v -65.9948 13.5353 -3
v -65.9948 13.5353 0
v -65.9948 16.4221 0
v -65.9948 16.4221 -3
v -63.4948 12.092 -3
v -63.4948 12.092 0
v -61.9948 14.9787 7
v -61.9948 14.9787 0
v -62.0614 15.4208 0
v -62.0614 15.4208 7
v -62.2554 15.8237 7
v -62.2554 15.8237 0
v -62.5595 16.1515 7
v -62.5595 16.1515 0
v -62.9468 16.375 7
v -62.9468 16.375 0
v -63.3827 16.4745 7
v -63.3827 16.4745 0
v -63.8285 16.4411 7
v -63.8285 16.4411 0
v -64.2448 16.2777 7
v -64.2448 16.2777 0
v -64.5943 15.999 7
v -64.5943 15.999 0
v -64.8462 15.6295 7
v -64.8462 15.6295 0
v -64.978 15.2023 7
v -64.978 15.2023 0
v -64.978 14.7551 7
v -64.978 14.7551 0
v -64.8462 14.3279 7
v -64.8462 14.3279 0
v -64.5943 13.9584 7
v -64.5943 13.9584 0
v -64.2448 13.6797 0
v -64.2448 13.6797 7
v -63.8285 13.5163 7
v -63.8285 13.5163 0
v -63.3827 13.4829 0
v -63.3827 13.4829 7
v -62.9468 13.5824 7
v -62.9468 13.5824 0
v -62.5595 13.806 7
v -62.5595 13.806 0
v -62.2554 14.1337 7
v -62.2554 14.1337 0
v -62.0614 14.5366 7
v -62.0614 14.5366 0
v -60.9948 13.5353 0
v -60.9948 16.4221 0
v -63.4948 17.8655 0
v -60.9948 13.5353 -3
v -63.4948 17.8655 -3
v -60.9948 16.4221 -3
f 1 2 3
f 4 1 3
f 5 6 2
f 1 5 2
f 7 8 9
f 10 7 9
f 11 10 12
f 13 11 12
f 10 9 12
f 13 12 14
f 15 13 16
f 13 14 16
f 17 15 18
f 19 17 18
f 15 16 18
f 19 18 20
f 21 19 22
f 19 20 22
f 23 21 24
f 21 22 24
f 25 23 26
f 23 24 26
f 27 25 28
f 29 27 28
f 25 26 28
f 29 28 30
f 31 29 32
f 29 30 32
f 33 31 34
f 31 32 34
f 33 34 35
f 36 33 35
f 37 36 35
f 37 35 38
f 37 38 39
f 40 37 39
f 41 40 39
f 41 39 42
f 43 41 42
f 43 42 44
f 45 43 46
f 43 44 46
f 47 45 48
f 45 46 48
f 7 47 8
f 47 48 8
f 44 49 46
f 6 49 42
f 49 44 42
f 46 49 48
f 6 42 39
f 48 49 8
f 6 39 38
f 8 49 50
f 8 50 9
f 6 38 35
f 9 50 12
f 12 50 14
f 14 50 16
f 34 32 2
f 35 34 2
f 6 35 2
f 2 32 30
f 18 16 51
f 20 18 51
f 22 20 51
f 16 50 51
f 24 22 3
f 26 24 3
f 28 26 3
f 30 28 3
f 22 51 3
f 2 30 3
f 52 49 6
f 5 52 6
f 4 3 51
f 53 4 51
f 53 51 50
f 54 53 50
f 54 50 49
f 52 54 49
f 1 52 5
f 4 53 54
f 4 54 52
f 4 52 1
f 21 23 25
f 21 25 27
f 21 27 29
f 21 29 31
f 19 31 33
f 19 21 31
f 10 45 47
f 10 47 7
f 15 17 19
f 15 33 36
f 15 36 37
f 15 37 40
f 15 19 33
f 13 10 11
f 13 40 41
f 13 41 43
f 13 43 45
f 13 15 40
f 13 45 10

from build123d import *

# Parameters (mm, degrees)
SKETCH1_R           = 1.5
BOSS_EXTRUDE1_DEPTH = 7
BOSS_EXTRUDE2_DEPTH = 3


with BuildPart() as part:
    # Sketch1 → Boss-Extrude1 (new body)
    with BuildSketch(Plane.XY):
        with Locations((-63.49476159, 14.978708134)):
            Circle(SKETCH1_R)
    extrude(amount=BOSS_EXTRUDE1_DEPTH)

    # Sketch2 → Boss-Extrude2 (add)
    with BuildSketch(Plane(origin=(0, 0, 0), x_dir=(-1, 0, 0), z_dir=(0, 0, -1))):
        Polygon((63.49476159, 12.091956788), (65.99476159, 13.535332461), (65.99476159, 16.422083807), (63.49476159, 17.86545948), (60.99476159, 16.422083807), (60.99476159, 13.535332461), align=None)
    extrude(amount=BOSS_EXTRUDE2_DEPTH)


solid = part.part
